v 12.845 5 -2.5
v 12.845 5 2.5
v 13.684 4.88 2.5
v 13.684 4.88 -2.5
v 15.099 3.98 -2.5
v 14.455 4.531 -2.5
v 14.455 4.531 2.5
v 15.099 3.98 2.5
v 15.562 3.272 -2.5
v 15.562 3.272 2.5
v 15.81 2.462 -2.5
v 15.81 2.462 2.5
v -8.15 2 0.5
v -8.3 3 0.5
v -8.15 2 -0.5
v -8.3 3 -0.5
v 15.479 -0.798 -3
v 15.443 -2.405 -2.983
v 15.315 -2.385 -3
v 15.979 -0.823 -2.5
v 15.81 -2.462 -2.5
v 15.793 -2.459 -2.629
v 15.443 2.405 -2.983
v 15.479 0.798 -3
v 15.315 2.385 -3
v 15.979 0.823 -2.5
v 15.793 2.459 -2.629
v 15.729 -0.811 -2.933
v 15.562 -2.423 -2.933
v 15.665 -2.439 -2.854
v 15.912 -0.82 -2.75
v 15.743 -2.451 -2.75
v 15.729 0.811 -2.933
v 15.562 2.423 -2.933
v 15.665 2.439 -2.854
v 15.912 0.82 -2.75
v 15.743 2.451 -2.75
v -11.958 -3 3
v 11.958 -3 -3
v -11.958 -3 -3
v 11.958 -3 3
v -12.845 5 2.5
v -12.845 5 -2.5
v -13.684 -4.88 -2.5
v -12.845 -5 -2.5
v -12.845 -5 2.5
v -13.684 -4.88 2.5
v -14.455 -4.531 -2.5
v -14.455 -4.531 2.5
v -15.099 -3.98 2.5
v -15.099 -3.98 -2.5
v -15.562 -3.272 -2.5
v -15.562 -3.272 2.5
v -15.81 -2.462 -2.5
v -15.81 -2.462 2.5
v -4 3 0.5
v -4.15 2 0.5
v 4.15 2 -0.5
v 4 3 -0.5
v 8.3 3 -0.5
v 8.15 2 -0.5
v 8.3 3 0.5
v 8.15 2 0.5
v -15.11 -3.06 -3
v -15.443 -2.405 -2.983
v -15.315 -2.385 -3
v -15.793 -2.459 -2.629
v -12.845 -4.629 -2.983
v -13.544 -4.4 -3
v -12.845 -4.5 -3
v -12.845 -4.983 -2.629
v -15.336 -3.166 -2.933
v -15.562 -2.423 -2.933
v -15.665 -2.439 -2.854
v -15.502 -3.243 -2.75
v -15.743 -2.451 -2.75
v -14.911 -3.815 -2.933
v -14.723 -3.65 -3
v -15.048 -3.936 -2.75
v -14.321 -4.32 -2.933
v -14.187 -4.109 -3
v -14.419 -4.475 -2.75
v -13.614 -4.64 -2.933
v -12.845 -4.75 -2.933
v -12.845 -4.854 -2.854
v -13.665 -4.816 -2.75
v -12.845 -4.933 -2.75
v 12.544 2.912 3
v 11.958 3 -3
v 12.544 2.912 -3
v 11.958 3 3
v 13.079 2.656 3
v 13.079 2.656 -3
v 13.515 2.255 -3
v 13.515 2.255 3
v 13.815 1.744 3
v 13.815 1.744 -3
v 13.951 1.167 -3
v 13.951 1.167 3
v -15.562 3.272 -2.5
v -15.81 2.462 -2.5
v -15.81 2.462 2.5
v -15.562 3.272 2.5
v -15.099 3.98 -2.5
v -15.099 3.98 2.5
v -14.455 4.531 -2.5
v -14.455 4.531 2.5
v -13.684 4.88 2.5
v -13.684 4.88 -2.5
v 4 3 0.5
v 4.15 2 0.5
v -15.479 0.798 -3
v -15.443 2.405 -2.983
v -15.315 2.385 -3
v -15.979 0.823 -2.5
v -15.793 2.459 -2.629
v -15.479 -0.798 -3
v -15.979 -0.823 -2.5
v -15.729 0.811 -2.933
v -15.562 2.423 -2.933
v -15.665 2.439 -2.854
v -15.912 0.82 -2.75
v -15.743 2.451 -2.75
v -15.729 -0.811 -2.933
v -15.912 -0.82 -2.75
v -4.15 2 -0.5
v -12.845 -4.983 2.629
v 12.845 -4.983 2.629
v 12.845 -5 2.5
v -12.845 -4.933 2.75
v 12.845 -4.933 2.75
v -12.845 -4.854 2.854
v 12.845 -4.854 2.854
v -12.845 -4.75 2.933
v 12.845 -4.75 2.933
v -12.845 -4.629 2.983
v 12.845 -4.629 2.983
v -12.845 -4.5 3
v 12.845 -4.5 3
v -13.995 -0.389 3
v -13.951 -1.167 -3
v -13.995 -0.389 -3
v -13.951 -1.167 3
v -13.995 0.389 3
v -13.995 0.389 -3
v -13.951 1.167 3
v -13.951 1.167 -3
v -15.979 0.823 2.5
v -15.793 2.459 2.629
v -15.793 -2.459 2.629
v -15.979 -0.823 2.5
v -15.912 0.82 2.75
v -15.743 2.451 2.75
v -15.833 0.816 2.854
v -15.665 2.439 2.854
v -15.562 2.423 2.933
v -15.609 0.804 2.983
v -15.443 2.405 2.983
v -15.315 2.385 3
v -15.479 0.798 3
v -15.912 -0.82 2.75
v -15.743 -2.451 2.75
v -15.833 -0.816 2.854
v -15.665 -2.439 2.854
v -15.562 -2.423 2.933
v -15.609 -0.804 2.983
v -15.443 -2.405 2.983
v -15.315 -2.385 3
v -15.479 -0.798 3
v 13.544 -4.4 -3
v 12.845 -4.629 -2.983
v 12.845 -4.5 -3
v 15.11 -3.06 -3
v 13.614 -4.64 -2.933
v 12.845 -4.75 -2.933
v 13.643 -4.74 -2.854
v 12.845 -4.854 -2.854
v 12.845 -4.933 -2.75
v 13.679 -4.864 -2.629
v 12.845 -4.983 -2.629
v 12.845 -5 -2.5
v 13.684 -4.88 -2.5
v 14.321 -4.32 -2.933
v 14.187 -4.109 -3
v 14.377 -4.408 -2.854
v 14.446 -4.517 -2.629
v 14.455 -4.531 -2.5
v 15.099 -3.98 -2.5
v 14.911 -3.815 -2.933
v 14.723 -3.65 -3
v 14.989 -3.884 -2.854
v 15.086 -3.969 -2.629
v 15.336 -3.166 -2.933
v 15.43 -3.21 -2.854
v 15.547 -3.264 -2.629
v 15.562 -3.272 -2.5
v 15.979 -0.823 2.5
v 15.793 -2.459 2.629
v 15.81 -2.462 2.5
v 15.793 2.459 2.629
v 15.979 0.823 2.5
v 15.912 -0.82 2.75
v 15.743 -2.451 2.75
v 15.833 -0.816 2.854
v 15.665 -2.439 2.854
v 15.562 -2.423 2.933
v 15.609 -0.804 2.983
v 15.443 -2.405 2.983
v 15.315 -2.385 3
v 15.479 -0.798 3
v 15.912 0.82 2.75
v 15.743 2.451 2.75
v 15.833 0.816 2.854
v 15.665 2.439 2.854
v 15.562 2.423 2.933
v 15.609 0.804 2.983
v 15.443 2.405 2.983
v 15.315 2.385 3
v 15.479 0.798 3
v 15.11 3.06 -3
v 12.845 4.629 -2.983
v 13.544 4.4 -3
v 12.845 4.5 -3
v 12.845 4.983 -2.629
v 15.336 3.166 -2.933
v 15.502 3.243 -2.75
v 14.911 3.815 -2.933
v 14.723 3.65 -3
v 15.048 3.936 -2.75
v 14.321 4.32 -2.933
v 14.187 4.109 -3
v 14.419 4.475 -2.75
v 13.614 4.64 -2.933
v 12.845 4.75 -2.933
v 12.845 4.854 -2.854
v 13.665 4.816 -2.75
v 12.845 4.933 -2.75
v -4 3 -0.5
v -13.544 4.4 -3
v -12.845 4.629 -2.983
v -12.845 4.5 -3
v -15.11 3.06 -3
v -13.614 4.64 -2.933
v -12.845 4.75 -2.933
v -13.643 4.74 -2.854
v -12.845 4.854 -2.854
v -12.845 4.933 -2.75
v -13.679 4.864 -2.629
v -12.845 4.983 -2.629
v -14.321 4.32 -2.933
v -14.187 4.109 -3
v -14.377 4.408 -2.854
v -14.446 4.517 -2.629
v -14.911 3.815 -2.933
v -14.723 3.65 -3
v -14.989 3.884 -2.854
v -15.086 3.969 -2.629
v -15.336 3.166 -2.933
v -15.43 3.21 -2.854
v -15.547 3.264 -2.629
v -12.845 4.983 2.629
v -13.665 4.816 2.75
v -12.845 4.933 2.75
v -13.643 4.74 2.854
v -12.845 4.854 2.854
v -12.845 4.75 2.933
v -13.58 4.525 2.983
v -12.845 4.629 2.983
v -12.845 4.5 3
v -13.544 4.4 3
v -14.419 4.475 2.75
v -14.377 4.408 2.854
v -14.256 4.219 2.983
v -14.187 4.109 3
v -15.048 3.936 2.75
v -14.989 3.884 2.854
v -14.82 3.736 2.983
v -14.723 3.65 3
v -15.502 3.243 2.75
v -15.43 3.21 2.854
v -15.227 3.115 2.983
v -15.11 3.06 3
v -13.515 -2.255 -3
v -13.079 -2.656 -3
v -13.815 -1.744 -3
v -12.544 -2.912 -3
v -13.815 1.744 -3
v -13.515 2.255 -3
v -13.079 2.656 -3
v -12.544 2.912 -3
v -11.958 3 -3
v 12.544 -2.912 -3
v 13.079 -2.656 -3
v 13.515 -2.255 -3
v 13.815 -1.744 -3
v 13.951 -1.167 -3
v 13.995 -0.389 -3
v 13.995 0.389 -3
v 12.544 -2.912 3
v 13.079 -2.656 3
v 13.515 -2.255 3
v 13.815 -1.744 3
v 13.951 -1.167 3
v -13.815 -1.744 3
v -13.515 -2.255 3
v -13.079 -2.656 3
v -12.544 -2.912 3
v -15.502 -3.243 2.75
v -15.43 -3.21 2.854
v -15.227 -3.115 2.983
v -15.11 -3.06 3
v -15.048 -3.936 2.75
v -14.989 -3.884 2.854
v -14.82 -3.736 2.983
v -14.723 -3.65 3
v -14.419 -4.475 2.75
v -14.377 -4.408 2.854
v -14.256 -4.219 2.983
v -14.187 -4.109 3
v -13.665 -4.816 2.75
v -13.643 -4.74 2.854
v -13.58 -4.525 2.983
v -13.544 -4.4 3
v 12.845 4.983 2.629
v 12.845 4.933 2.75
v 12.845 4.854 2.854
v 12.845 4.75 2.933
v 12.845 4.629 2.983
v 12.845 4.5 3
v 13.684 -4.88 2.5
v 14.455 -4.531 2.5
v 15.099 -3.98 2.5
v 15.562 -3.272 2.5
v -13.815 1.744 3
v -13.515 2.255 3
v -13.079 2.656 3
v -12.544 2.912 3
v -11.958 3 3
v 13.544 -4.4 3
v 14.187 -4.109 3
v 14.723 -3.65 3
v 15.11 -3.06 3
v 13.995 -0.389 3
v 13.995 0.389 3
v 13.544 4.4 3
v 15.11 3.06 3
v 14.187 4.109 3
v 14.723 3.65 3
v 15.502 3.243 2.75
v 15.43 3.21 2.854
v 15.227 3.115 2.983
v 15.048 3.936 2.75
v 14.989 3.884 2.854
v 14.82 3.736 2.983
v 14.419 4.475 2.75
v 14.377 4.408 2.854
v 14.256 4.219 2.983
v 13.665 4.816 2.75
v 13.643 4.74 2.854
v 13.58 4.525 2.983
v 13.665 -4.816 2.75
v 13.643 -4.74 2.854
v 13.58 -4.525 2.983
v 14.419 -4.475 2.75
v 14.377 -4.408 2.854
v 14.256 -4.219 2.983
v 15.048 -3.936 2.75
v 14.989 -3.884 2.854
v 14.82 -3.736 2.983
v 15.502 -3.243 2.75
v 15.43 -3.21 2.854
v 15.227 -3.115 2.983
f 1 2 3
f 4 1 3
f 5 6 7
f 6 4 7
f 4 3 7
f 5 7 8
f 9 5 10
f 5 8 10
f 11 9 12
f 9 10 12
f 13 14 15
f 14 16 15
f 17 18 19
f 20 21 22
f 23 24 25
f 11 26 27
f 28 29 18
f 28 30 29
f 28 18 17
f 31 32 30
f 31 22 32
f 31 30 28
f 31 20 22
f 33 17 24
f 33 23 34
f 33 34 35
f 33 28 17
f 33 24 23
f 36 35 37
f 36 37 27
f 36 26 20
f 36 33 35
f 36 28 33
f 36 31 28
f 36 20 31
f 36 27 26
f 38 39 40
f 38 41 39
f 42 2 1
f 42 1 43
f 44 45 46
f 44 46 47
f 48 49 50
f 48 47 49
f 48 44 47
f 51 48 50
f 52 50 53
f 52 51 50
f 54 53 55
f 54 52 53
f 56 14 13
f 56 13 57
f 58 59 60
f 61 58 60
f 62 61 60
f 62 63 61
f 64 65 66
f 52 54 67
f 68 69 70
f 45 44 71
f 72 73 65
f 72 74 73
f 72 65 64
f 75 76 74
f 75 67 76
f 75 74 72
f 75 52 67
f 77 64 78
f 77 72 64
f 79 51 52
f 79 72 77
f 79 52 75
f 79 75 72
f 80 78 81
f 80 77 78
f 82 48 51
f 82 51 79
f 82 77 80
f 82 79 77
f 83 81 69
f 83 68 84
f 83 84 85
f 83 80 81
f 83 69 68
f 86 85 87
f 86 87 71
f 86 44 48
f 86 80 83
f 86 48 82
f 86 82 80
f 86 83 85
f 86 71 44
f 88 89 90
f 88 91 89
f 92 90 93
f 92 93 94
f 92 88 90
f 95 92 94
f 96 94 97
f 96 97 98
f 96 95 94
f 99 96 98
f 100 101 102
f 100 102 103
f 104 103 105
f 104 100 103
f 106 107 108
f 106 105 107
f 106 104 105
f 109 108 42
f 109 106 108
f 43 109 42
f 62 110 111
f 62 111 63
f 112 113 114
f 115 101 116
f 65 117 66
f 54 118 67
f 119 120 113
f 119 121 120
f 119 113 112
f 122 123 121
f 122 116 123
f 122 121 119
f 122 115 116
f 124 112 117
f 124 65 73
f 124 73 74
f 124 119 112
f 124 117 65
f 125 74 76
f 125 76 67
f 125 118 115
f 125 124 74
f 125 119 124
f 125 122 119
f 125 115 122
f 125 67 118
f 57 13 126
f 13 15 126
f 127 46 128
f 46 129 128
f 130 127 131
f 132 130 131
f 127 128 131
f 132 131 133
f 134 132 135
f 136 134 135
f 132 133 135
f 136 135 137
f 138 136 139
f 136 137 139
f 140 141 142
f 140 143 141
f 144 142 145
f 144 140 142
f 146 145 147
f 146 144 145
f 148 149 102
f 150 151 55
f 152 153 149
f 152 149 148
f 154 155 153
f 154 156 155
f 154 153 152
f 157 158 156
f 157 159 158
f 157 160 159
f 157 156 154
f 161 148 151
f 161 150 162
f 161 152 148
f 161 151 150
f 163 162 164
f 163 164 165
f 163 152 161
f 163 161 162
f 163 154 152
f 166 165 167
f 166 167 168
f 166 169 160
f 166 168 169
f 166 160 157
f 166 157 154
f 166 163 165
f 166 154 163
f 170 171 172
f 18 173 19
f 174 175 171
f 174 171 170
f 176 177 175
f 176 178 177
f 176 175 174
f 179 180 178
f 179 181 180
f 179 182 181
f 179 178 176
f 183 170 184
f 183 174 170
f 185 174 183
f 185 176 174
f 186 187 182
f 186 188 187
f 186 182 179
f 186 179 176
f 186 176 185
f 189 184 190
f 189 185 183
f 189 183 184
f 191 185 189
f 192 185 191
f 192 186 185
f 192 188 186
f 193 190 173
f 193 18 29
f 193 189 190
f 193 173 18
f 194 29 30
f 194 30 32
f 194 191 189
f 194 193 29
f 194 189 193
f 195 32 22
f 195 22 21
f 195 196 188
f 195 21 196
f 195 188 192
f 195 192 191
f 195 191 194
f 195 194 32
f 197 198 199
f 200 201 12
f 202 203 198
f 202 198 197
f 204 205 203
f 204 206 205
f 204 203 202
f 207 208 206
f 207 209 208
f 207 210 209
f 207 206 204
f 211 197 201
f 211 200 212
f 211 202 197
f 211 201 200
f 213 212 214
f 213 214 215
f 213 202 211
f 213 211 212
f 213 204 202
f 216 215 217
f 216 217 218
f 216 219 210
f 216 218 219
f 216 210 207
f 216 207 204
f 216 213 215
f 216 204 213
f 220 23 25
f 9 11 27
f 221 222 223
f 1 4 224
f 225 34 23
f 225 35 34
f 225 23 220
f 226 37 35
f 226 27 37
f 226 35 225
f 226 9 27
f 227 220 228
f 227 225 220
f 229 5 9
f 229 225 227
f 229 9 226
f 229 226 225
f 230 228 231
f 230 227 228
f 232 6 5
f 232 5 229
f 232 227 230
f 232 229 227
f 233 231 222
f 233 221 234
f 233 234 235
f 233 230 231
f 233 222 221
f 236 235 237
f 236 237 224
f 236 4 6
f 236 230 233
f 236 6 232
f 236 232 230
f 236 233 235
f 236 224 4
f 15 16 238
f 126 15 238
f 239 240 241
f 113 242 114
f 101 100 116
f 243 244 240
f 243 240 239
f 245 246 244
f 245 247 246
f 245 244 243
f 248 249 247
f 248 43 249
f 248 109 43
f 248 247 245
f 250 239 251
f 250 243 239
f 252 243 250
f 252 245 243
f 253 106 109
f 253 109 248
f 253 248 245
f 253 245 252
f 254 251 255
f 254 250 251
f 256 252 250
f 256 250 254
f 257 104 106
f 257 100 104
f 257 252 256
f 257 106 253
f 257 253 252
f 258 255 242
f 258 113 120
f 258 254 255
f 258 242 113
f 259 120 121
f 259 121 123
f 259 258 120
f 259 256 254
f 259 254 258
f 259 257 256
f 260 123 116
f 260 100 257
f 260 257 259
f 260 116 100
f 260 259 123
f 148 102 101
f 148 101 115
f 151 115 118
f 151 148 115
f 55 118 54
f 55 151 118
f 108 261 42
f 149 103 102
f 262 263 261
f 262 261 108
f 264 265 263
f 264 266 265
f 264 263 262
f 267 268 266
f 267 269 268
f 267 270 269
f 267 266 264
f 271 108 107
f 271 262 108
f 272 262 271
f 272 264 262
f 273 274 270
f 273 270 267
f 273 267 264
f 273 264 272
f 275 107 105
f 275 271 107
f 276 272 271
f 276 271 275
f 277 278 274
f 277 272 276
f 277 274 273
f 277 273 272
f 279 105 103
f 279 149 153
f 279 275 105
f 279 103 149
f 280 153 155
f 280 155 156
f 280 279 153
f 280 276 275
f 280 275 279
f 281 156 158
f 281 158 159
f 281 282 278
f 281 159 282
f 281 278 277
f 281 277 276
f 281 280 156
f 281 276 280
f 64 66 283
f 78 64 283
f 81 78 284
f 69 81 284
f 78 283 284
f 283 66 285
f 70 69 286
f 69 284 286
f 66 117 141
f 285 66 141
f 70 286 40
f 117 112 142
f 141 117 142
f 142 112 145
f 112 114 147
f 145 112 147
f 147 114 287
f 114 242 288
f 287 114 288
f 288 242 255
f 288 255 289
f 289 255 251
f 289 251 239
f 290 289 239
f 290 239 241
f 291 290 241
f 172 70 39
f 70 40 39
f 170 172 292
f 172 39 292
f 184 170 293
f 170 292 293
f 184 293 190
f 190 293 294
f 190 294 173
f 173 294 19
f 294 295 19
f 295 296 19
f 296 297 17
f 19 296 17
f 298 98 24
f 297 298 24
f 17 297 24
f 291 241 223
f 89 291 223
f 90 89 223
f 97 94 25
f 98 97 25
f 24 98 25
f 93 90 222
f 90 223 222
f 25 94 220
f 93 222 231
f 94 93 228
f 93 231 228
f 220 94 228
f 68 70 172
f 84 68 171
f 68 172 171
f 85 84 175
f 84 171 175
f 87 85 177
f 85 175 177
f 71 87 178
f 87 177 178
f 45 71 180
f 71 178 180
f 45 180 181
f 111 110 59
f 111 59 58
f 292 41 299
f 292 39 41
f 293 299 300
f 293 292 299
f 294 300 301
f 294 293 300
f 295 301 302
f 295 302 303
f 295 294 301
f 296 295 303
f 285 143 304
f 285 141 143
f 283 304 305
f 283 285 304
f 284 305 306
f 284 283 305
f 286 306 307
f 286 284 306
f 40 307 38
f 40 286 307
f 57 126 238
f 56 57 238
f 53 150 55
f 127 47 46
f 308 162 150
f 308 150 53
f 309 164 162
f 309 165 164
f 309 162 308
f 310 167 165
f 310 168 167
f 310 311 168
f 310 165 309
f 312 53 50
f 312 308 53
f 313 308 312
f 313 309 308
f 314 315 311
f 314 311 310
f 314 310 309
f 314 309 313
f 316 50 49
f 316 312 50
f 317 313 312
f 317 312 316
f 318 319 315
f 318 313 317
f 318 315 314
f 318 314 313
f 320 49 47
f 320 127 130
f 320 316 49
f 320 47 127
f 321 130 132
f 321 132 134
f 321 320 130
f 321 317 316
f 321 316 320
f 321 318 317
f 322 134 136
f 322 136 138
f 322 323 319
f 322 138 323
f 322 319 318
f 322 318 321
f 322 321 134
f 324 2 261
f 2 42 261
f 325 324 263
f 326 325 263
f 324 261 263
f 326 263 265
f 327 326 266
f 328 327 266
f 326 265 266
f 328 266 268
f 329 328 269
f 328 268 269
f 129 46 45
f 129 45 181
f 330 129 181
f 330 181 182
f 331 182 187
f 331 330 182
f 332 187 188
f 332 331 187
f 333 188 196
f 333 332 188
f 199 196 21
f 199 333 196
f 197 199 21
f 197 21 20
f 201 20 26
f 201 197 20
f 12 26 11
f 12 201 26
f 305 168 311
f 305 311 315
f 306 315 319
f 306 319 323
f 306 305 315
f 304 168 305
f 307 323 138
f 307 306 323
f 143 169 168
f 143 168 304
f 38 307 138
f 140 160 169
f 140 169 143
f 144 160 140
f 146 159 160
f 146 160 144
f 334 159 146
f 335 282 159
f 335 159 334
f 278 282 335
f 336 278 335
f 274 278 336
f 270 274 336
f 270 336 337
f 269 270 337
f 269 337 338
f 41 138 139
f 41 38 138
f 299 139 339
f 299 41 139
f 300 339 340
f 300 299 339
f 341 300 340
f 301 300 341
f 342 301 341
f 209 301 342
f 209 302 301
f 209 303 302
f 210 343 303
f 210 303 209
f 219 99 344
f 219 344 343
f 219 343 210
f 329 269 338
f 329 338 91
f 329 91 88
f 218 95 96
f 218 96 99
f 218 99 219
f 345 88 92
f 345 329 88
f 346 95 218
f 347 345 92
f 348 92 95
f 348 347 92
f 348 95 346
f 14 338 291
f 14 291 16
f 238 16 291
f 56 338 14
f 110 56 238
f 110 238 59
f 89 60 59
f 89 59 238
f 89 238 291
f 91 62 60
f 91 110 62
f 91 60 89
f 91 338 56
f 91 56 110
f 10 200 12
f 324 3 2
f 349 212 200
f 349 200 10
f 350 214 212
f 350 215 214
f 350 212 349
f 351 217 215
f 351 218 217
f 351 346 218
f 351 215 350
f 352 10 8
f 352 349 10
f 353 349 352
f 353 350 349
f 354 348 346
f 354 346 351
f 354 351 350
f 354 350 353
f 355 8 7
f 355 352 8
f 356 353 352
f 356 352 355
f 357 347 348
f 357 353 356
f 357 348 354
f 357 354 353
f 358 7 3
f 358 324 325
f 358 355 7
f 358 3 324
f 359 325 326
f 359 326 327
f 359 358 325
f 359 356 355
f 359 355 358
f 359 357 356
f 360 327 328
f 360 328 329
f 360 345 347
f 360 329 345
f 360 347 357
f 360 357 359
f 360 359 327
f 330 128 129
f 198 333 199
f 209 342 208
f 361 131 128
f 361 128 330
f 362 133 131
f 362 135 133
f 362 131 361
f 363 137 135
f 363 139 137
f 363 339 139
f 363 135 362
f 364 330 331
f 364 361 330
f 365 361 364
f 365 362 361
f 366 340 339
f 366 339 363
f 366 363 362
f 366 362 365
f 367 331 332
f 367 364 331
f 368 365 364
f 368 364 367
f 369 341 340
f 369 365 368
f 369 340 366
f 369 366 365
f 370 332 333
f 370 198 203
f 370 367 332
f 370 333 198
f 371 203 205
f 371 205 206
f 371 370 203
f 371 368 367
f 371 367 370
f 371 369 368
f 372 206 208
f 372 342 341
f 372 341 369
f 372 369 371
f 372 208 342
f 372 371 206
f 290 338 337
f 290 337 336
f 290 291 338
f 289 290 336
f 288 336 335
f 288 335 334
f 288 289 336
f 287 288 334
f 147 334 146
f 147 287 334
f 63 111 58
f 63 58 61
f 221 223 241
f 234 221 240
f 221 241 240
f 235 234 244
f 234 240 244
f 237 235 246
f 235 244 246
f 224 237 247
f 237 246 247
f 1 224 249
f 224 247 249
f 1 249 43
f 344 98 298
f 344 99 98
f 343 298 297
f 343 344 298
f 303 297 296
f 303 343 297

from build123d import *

# Parameters (mm, degrees)
F1_DEPTH = 3
F2_R     = 3
F3_R     = 2
F5_DEPTH = 0.5
F6_R     = 0.5


with BuildPart() as f1:
    # F0 (on Top) → F1 (new body, symmetric)
    with BuildSketch(Plane.XY):
        with BuildLine():
            Line((-15.1986841536, -5), (15.1986841536, -5))
            ThreePointArc((15.1986841536, -5), (16, 0), (15.1986841536, 5))
            Line((15.1986841536, 5), (-15.1986841536, 5))
            ThreePointArc((-15.1986841536, 5), (-16, 0), (-15.1986841536, -5))
        make_face()
        with BuildLine():
            ThreePointArc((13.6747943312, 3), (14, 0), (13.6747943312, -3))
            Line((13.6747943312, -3), (-13.6747943312, -3))
            ThreePointArc((-13.6747943312, -3), (-14, 0), (-13.6747943312, 3))
            Line((-13.6747943312, 3), (13.6747943312, 3))
        make_face(mode=Mode.SUBTRACT)
    extrude(amount=F1_DEPTH, both=True)

    # F2
    f2_edges = [f1.edges().sort_by_distance(p)[0] for p in [
        (-15.198684, 5, 0),
        (15.198684, 5, 0),
        (15.198684, -5, 0),
        (-15.198684, -5, 0),
    ]]
    fillet(f2_edges, radius=F2_R)

    # F3
    f3_edges = [f1.edges().sort_by_distance(p)[0] for p in [
        (13.674794, 3, 0),
        (13.674794, -3, 0),
        (-13.674794, -3, 0),
        (-13.674794, 3, 0),
    ]]
    fillet(f3_edges, radius=F3_R)

    # F4 (on Top) → F5 (join, symmetric)
    with BuildSketch(Plane.XY):
        Polygon((-4, 3), (-8.3, 3), (-8.15, 2), (-4.15, 2), align=None)
        Polygon((8.3, 3), (4, 3), (4.15, 2), (8.15, 2), align=None)
    extrude(amount=F5_DEPTH, both=True)

    # F6
    f6_edges = [f1.edges().sort_by_distance(p)[0] for p in [
        (0, -5, 3),
        (14.796563, -4.278664, 3),
        (16, 0, 3),
        (14.796563, 4.278664, 3),
        (0, 5, 3),
        (-14.796563, -4.278664, 3),
        (-16, 0, 3),
        (-14.796563, 4.278664, 3),
        (-16, 0, -3),
        (-14.796563, 4.278664, -3),
        (-14.796563, -4.278664, -3),
        (0, -5, -3),
        (0, 5, -3),
        (14.796563, -4.278664, -3),
        (16, 0, -3),
        (14.796563, 4.278664, -3),
    ]]
    fillet(f6_edges, radius=F6_R)


solid = f1.part
